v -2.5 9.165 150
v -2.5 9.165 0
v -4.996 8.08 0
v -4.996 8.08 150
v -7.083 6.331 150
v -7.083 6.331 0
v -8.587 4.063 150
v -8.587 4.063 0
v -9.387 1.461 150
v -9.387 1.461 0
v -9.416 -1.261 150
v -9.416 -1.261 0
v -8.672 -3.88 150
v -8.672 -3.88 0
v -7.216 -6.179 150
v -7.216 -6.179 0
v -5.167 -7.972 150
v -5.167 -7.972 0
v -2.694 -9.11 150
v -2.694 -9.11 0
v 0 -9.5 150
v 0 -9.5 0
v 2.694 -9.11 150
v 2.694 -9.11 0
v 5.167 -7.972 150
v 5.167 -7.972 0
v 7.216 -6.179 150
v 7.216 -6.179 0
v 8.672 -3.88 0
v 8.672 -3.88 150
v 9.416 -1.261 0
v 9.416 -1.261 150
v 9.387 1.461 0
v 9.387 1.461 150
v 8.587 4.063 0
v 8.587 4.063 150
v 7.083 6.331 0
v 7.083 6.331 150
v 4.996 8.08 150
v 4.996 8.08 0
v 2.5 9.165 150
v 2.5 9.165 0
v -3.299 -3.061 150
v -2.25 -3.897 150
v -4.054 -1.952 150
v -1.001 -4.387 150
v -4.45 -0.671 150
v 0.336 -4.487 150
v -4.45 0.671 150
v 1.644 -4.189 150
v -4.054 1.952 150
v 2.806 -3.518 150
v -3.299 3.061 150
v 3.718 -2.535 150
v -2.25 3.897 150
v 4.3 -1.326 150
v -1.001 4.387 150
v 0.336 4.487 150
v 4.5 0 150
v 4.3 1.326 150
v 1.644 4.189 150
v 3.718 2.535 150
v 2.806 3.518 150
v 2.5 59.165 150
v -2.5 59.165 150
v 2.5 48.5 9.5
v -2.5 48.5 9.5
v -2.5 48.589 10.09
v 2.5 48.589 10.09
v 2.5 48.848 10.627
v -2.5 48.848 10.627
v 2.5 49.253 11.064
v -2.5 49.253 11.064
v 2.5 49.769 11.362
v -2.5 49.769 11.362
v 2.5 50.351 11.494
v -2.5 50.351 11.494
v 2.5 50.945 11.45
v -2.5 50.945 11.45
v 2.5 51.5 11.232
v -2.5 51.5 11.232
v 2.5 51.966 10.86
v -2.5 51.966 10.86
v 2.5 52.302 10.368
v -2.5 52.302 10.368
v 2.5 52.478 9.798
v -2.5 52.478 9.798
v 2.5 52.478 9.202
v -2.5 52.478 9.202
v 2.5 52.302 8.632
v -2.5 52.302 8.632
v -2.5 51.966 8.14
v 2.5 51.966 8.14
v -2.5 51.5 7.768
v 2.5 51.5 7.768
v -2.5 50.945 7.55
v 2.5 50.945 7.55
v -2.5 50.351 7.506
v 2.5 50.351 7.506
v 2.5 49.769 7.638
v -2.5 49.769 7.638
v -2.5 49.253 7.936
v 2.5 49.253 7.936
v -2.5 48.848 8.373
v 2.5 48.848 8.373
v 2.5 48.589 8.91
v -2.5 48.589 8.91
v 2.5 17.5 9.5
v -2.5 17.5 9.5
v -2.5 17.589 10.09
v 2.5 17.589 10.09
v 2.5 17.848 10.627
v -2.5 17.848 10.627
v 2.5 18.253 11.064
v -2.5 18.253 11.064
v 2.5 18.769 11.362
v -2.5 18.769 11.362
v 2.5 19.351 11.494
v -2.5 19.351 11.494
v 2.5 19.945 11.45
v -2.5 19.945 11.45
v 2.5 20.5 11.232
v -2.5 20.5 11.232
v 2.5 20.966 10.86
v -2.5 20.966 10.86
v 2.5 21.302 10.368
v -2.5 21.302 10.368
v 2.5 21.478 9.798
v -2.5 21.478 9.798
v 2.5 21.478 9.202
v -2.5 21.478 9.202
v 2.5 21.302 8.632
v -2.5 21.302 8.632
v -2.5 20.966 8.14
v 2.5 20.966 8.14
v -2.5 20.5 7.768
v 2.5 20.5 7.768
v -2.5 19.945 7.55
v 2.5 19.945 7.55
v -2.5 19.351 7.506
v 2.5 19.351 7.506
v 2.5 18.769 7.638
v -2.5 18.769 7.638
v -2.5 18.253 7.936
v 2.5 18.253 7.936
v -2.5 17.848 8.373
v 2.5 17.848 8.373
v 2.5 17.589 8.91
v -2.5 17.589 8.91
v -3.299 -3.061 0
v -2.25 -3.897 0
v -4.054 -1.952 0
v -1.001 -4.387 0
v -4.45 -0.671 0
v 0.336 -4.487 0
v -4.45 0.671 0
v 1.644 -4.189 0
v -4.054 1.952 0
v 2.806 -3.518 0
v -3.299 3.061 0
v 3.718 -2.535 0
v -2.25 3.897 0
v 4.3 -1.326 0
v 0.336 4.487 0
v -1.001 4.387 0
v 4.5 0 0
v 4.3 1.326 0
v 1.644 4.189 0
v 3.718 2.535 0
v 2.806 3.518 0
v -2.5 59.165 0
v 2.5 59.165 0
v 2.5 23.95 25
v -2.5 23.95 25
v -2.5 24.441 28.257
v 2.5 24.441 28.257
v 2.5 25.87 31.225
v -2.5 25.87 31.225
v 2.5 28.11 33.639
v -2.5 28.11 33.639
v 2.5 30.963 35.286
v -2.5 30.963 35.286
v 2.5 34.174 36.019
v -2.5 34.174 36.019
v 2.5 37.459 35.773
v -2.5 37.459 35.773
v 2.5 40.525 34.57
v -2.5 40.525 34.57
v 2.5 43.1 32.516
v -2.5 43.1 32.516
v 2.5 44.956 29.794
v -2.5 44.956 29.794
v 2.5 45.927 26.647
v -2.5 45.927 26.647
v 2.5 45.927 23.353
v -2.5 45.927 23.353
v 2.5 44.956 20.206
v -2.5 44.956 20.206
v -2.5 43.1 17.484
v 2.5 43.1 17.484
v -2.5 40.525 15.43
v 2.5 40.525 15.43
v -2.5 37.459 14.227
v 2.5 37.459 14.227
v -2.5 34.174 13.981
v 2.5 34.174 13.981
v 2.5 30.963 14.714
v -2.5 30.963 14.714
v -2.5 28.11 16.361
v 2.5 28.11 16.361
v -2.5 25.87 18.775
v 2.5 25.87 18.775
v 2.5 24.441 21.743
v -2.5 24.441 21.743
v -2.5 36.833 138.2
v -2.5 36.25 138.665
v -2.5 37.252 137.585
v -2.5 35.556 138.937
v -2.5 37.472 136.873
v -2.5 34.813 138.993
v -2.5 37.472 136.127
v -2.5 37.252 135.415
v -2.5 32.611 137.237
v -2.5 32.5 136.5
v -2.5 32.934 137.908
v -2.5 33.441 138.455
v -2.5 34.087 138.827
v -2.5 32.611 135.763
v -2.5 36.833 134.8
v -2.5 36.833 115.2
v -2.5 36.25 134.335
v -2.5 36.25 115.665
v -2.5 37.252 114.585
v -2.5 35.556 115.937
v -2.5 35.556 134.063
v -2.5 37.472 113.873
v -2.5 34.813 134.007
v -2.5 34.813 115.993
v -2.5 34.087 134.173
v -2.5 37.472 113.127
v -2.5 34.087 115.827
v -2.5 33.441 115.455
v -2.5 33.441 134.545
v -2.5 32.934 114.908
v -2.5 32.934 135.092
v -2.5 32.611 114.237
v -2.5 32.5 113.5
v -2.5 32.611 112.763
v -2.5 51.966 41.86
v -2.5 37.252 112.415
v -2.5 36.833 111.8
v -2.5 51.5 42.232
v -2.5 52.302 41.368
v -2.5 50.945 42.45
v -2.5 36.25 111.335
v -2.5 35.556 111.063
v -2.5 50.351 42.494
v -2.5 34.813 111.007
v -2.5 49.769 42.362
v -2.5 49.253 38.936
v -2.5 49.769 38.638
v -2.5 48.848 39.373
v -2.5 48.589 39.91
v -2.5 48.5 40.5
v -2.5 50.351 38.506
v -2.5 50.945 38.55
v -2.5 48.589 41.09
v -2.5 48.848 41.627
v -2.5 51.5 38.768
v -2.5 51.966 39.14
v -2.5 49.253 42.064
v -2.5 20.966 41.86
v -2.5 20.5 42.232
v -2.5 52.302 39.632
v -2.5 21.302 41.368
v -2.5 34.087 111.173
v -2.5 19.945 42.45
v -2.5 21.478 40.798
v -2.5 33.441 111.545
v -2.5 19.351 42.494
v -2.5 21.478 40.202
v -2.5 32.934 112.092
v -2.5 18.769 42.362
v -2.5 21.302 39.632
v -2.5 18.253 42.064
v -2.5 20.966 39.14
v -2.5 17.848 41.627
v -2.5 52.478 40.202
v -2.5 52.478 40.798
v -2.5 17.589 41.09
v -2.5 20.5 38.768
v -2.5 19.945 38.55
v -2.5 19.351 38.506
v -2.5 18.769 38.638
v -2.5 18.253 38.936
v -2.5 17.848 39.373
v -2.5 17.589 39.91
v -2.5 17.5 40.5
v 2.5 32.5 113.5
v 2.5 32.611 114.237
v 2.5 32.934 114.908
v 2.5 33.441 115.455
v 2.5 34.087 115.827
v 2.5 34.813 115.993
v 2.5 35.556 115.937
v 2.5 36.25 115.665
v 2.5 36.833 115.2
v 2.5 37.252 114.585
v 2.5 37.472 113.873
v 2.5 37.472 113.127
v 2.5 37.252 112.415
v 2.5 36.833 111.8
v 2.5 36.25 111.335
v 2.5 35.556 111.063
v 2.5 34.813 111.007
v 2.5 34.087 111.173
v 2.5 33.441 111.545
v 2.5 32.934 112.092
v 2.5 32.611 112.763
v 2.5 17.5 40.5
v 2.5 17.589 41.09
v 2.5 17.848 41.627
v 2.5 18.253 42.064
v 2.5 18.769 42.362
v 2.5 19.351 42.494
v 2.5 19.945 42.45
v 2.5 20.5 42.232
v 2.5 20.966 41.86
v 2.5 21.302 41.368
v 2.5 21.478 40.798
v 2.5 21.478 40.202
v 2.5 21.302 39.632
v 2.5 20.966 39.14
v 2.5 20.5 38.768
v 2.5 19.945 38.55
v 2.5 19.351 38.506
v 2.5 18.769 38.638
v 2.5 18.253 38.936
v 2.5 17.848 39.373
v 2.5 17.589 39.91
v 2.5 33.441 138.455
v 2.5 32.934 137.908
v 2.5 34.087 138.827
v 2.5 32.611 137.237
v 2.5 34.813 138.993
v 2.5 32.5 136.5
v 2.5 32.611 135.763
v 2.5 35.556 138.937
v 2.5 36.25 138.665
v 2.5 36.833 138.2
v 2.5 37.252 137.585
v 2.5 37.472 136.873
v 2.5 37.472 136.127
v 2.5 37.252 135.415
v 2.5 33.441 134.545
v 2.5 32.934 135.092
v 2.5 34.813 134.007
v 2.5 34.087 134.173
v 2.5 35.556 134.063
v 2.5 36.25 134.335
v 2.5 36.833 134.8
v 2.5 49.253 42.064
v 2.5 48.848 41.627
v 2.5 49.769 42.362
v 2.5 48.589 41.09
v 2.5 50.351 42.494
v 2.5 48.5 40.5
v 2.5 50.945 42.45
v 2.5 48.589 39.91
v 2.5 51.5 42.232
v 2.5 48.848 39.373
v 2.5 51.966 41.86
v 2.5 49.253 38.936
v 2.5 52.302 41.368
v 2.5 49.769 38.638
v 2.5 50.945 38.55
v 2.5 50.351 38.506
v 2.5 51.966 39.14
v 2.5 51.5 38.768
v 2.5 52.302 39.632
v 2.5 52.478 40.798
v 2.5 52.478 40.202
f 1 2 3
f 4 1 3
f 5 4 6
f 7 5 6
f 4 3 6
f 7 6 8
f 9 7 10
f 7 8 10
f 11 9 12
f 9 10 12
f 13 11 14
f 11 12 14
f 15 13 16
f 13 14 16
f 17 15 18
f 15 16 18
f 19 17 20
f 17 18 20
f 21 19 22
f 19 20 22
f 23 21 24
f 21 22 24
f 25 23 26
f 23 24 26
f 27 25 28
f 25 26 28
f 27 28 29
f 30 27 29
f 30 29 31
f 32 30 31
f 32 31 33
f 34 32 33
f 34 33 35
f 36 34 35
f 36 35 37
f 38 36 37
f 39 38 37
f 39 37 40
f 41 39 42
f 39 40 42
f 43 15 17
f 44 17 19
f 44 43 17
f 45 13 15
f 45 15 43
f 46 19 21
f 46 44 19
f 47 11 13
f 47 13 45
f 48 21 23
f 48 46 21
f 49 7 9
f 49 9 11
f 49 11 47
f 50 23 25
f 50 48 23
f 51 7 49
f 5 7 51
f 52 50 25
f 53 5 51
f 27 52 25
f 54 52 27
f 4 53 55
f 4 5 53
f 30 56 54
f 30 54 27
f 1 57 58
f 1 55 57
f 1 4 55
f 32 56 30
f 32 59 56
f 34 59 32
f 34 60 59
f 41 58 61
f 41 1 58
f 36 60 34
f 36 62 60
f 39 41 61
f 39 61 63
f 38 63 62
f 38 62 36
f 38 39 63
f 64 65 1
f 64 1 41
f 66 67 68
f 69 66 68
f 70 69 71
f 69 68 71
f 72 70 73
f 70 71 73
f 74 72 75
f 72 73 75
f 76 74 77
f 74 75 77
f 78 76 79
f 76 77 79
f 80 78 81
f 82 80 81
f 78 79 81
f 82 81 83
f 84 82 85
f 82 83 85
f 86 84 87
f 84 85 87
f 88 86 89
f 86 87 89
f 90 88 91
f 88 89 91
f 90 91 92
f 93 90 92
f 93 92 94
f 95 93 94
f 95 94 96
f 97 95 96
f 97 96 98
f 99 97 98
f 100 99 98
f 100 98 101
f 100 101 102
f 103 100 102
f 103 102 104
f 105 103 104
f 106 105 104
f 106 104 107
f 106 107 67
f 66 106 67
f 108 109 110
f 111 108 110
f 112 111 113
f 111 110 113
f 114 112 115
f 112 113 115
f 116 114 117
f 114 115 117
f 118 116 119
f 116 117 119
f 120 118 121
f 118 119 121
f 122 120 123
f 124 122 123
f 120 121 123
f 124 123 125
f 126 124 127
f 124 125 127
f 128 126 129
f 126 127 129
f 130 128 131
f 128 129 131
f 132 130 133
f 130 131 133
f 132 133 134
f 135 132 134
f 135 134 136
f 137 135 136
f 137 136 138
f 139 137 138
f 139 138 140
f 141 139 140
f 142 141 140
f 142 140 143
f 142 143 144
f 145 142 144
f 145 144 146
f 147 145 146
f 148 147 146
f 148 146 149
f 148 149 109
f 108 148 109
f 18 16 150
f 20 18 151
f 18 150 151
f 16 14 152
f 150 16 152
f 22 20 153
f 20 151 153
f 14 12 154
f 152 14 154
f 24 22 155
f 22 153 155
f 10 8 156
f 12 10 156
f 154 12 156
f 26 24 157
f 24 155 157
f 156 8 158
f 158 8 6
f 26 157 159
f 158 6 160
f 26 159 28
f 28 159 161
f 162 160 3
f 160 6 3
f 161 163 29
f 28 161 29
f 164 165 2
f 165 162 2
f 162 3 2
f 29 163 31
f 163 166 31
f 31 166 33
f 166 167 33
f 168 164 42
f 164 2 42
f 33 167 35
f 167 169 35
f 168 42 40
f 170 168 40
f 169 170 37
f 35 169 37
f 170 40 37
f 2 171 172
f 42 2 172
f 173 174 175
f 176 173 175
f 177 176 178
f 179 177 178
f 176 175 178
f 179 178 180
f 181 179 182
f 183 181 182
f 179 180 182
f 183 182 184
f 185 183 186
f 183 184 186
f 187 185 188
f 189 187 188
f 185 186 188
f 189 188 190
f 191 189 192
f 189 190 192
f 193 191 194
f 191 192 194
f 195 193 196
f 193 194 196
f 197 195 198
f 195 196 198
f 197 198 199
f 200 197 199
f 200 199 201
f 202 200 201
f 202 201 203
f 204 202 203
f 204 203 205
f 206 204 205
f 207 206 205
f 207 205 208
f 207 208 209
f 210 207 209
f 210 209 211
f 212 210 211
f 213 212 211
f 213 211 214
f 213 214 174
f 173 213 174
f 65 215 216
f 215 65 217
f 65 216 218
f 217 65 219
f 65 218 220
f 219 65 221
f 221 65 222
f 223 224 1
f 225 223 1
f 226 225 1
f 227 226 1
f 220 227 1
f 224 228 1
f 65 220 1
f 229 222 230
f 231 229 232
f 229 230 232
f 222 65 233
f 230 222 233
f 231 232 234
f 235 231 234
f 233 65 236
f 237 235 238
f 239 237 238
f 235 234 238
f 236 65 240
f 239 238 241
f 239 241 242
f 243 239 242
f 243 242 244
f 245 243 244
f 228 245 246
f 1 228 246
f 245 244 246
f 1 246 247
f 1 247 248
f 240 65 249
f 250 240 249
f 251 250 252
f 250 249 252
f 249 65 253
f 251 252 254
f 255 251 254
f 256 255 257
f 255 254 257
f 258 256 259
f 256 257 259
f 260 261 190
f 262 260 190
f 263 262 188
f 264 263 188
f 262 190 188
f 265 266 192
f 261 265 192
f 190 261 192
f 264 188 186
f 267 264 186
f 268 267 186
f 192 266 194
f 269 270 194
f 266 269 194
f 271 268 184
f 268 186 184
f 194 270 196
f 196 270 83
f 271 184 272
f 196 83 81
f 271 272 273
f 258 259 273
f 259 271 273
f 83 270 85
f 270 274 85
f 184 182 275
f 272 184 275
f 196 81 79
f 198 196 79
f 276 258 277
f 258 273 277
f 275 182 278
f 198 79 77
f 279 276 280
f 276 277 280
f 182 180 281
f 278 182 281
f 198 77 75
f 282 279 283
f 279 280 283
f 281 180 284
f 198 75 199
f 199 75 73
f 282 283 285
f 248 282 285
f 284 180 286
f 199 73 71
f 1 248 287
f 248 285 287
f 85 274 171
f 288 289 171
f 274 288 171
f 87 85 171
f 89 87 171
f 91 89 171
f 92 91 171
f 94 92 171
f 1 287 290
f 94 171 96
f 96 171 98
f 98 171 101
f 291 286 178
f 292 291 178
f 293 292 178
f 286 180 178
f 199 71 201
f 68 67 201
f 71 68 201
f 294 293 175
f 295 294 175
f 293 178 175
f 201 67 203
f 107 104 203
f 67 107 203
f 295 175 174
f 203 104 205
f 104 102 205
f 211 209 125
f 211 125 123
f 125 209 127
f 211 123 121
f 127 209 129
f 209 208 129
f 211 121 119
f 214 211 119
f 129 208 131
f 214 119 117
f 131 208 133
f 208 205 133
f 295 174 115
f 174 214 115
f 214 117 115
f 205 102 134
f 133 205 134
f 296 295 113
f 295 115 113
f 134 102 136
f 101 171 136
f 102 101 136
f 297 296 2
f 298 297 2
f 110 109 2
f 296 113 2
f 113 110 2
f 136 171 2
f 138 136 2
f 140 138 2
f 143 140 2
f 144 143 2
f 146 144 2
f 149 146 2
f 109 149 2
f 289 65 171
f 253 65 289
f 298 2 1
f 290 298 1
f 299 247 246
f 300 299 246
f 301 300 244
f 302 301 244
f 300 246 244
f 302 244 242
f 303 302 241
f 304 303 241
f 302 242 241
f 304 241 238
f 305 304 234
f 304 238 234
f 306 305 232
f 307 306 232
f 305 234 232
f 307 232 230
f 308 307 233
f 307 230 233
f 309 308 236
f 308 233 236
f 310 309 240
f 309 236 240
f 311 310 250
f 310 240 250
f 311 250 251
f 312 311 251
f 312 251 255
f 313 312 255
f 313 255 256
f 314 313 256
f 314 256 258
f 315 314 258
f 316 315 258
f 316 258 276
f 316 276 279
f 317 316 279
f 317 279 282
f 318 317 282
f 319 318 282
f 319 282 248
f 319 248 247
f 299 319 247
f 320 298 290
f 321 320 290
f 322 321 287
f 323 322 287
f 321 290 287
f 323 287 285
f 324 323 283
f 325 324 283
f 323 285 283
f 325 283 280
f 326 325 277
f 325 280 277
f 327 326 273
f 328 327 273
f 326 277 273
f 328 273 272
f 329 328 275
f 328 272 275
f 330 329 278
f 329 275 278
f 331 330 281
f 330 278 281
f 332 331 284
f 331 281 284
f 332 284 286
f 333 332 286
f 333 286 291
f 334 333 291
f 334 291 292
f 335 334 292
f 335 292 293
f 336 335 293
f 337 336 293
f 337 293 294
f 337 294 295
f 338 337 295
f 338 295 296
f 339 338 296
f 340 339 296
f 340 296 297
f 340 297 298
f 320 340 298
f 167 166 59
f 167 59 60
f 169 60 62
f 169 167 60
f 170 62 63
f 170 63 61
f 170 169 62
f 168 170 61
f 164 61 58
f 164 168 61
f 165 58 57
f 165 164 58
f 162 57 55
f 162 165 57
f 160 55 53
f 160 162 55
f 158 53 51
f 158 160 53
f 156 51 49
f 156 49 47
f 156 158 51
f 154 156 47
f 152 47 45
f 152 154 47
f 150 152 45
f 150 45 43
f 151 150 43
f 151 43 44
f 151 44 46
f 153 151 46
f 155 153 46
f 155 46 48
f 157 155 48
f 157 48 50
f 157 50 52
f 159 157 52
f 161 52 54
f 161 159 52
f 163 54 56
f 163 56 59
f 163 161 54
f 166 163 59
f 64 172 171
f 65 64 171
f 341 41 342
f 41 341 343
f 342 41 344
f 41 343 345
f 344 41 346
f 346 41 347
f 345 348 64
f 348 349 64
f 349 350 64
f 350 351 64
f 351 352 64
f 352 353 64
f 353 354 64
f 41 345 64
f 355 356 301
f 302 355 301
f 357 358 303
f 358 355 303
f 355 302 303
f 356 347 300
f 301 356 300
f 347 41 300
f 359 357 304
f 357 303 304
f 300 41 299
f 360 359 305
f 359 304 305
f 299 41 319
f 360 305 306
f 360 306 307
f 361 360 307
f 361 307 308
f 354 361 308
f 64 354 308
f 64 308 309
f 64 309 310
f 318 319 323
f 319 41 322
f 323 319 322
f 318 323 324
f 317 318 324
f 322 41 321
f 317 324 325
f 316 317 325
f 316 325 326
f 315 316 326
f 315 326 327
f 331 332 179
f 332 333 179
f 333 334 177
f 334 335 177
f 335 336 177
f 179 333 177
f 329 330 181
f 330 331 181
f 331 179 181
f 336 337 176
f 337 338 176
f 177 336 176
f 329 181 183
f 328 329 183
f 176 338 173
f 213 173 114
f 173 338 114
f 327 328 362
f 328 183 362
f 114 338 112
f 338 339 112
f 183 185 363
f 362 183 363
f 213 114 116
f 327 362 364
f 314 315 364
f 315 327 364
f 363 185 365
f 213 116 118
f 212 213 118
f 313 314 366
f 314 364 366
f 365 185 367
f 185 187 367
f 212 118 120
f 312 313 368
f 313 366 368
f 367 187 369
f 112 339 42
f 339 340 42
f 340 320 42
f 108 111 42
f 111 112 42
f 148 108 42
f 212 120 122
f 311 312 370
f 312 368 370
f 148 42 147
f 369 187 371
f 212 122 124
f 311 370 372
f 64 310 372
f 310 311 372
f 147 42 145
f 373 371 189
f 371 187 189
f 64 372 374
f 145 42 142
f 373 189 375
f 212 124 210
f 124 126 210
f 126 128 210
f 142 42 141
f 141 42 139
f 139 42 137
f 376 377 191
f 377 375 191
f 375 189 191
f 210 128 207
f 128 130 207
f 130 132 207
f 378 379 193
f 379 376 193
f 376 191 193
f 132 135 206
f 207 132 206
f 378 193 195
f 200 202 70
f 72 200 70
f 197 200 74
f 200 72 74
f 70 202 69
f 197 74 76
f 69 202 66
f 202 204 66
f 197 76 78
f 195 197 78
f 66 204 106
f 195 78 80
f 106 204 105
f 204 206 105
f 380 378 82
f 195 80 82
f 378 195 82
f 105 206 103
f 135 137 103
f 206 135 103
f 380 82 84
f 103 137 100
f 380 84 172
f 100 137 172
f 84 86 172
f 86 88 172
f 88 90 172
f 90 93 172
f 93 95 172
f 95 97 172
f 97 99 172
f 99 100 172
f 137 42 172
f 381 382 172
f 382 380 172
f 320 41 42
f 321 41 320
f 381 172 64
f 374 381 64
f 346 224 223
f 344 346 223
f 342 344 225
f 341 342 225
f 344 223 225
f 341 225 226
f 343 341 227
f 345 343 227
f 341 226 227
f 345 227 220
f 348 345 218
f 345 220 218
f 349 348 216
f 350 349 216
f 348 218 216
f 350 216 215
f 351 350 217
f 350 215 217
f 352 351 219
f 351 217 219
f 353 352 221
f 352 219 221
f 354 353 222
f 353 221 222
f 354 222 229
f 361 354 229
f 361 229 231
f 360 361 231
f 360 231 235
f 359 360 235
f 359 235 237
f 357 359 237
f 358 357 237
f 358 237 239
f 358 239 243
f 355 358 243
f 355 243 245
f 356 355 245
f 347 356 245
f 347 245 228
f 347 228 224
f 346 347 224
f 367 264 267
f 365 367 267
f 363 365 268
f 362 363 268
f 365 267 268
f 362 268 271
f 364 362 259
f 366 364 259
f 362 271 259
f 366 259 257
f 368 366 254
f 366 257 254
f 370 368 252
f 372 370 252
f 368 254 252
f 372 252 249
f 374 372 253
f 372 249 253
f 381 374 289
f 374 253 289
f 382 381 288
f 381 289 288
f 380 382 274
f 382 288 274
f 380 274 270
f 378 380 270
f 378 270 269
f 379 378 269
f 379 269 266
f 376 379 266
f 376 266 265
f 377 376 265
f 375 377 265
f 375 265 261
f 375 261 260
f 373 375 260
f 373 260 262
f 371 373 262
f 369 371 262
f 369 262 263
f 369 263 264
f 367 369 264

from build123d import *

# Parameters (mm, degrees)
SKETCH1_R           = 4.5
BOSS_EXTRUDE1_DEPTH = 150
SKETCH2_R           = 2
SKETCH2_R_2         = 11.05
CUT_EXTRUDE1_DEPTH  = 162.692656416
SKETCH3_R           = 2.5
CUT_EXTRUDE2_DEPTH  = 162.692656416


with BuildPart() as part:
    # Sketch1 → Boss-Extrude1 (new body)
    with BuildSketch(Plane.XY):
        with BuildLine():
            Line((-2.5, 59.16515139), (-2.5, 9.16515139))
            ThreePointArc((-2.5, 9.16515139), (0, -9.5), (2.5, 9.16515139))
            Line((2.5, 9.16515139), (2.5, 59.16515139))
            Line((2.5, 59.16515139), (-2.5, 59.16515139))
        make_face()
        Circle(SKETCH1_R, mode=Mode.SUBTRACT)
    extrude(amount=BOSS_EXTRUDE1_DEPTH)

    # Sketch2 → Cut-Extrude1 (cut, through all)
    with BuildSketch(Plane.ZY.offset(2.5)):
        with Locations(Location((9.5, 50.5, 0), (0, 0, 270))):
            Circle(SKETCH2_R)
        with Locations(Location((40.5, 50.5, 0), (0, 0, 270))):
            Circle(SKETCH2_R)
        with Locations(Location((40.5, 19.5, 0), (0, 0, 270))):
            Circle(SKETCH2_R)
        with Locations(Location((9.5, 19.5, 0), (0, 0, 270))):
            Circle(SKETCH2_R)
        with Locations(Location((25, 35, 0), (0, 0, 270))):
            Circle(SKETCH2_R_2)
    extrude(amount=-CUT_EXTRUDE1_DEPTH, mode=Mode.SUBTRACT)

    # Sketch3 → Cut-Extrude2 (cut, through all)
    with BuildSketch(Plane.ZY.offset(2.5)):
        with Locations(Location((113.5, 35, 0), (0, 0, 270))):
            Circle(SKETCH3_R)
        with Locations(Location((136.5, 35, 0), (0, 0, 270))):
            Circle(SKETCH3_R)
    extrude(amount=-CUT_EXTRUDE2_DEPTH, mode=Mode.SUBTRACT)


solid = part.part
